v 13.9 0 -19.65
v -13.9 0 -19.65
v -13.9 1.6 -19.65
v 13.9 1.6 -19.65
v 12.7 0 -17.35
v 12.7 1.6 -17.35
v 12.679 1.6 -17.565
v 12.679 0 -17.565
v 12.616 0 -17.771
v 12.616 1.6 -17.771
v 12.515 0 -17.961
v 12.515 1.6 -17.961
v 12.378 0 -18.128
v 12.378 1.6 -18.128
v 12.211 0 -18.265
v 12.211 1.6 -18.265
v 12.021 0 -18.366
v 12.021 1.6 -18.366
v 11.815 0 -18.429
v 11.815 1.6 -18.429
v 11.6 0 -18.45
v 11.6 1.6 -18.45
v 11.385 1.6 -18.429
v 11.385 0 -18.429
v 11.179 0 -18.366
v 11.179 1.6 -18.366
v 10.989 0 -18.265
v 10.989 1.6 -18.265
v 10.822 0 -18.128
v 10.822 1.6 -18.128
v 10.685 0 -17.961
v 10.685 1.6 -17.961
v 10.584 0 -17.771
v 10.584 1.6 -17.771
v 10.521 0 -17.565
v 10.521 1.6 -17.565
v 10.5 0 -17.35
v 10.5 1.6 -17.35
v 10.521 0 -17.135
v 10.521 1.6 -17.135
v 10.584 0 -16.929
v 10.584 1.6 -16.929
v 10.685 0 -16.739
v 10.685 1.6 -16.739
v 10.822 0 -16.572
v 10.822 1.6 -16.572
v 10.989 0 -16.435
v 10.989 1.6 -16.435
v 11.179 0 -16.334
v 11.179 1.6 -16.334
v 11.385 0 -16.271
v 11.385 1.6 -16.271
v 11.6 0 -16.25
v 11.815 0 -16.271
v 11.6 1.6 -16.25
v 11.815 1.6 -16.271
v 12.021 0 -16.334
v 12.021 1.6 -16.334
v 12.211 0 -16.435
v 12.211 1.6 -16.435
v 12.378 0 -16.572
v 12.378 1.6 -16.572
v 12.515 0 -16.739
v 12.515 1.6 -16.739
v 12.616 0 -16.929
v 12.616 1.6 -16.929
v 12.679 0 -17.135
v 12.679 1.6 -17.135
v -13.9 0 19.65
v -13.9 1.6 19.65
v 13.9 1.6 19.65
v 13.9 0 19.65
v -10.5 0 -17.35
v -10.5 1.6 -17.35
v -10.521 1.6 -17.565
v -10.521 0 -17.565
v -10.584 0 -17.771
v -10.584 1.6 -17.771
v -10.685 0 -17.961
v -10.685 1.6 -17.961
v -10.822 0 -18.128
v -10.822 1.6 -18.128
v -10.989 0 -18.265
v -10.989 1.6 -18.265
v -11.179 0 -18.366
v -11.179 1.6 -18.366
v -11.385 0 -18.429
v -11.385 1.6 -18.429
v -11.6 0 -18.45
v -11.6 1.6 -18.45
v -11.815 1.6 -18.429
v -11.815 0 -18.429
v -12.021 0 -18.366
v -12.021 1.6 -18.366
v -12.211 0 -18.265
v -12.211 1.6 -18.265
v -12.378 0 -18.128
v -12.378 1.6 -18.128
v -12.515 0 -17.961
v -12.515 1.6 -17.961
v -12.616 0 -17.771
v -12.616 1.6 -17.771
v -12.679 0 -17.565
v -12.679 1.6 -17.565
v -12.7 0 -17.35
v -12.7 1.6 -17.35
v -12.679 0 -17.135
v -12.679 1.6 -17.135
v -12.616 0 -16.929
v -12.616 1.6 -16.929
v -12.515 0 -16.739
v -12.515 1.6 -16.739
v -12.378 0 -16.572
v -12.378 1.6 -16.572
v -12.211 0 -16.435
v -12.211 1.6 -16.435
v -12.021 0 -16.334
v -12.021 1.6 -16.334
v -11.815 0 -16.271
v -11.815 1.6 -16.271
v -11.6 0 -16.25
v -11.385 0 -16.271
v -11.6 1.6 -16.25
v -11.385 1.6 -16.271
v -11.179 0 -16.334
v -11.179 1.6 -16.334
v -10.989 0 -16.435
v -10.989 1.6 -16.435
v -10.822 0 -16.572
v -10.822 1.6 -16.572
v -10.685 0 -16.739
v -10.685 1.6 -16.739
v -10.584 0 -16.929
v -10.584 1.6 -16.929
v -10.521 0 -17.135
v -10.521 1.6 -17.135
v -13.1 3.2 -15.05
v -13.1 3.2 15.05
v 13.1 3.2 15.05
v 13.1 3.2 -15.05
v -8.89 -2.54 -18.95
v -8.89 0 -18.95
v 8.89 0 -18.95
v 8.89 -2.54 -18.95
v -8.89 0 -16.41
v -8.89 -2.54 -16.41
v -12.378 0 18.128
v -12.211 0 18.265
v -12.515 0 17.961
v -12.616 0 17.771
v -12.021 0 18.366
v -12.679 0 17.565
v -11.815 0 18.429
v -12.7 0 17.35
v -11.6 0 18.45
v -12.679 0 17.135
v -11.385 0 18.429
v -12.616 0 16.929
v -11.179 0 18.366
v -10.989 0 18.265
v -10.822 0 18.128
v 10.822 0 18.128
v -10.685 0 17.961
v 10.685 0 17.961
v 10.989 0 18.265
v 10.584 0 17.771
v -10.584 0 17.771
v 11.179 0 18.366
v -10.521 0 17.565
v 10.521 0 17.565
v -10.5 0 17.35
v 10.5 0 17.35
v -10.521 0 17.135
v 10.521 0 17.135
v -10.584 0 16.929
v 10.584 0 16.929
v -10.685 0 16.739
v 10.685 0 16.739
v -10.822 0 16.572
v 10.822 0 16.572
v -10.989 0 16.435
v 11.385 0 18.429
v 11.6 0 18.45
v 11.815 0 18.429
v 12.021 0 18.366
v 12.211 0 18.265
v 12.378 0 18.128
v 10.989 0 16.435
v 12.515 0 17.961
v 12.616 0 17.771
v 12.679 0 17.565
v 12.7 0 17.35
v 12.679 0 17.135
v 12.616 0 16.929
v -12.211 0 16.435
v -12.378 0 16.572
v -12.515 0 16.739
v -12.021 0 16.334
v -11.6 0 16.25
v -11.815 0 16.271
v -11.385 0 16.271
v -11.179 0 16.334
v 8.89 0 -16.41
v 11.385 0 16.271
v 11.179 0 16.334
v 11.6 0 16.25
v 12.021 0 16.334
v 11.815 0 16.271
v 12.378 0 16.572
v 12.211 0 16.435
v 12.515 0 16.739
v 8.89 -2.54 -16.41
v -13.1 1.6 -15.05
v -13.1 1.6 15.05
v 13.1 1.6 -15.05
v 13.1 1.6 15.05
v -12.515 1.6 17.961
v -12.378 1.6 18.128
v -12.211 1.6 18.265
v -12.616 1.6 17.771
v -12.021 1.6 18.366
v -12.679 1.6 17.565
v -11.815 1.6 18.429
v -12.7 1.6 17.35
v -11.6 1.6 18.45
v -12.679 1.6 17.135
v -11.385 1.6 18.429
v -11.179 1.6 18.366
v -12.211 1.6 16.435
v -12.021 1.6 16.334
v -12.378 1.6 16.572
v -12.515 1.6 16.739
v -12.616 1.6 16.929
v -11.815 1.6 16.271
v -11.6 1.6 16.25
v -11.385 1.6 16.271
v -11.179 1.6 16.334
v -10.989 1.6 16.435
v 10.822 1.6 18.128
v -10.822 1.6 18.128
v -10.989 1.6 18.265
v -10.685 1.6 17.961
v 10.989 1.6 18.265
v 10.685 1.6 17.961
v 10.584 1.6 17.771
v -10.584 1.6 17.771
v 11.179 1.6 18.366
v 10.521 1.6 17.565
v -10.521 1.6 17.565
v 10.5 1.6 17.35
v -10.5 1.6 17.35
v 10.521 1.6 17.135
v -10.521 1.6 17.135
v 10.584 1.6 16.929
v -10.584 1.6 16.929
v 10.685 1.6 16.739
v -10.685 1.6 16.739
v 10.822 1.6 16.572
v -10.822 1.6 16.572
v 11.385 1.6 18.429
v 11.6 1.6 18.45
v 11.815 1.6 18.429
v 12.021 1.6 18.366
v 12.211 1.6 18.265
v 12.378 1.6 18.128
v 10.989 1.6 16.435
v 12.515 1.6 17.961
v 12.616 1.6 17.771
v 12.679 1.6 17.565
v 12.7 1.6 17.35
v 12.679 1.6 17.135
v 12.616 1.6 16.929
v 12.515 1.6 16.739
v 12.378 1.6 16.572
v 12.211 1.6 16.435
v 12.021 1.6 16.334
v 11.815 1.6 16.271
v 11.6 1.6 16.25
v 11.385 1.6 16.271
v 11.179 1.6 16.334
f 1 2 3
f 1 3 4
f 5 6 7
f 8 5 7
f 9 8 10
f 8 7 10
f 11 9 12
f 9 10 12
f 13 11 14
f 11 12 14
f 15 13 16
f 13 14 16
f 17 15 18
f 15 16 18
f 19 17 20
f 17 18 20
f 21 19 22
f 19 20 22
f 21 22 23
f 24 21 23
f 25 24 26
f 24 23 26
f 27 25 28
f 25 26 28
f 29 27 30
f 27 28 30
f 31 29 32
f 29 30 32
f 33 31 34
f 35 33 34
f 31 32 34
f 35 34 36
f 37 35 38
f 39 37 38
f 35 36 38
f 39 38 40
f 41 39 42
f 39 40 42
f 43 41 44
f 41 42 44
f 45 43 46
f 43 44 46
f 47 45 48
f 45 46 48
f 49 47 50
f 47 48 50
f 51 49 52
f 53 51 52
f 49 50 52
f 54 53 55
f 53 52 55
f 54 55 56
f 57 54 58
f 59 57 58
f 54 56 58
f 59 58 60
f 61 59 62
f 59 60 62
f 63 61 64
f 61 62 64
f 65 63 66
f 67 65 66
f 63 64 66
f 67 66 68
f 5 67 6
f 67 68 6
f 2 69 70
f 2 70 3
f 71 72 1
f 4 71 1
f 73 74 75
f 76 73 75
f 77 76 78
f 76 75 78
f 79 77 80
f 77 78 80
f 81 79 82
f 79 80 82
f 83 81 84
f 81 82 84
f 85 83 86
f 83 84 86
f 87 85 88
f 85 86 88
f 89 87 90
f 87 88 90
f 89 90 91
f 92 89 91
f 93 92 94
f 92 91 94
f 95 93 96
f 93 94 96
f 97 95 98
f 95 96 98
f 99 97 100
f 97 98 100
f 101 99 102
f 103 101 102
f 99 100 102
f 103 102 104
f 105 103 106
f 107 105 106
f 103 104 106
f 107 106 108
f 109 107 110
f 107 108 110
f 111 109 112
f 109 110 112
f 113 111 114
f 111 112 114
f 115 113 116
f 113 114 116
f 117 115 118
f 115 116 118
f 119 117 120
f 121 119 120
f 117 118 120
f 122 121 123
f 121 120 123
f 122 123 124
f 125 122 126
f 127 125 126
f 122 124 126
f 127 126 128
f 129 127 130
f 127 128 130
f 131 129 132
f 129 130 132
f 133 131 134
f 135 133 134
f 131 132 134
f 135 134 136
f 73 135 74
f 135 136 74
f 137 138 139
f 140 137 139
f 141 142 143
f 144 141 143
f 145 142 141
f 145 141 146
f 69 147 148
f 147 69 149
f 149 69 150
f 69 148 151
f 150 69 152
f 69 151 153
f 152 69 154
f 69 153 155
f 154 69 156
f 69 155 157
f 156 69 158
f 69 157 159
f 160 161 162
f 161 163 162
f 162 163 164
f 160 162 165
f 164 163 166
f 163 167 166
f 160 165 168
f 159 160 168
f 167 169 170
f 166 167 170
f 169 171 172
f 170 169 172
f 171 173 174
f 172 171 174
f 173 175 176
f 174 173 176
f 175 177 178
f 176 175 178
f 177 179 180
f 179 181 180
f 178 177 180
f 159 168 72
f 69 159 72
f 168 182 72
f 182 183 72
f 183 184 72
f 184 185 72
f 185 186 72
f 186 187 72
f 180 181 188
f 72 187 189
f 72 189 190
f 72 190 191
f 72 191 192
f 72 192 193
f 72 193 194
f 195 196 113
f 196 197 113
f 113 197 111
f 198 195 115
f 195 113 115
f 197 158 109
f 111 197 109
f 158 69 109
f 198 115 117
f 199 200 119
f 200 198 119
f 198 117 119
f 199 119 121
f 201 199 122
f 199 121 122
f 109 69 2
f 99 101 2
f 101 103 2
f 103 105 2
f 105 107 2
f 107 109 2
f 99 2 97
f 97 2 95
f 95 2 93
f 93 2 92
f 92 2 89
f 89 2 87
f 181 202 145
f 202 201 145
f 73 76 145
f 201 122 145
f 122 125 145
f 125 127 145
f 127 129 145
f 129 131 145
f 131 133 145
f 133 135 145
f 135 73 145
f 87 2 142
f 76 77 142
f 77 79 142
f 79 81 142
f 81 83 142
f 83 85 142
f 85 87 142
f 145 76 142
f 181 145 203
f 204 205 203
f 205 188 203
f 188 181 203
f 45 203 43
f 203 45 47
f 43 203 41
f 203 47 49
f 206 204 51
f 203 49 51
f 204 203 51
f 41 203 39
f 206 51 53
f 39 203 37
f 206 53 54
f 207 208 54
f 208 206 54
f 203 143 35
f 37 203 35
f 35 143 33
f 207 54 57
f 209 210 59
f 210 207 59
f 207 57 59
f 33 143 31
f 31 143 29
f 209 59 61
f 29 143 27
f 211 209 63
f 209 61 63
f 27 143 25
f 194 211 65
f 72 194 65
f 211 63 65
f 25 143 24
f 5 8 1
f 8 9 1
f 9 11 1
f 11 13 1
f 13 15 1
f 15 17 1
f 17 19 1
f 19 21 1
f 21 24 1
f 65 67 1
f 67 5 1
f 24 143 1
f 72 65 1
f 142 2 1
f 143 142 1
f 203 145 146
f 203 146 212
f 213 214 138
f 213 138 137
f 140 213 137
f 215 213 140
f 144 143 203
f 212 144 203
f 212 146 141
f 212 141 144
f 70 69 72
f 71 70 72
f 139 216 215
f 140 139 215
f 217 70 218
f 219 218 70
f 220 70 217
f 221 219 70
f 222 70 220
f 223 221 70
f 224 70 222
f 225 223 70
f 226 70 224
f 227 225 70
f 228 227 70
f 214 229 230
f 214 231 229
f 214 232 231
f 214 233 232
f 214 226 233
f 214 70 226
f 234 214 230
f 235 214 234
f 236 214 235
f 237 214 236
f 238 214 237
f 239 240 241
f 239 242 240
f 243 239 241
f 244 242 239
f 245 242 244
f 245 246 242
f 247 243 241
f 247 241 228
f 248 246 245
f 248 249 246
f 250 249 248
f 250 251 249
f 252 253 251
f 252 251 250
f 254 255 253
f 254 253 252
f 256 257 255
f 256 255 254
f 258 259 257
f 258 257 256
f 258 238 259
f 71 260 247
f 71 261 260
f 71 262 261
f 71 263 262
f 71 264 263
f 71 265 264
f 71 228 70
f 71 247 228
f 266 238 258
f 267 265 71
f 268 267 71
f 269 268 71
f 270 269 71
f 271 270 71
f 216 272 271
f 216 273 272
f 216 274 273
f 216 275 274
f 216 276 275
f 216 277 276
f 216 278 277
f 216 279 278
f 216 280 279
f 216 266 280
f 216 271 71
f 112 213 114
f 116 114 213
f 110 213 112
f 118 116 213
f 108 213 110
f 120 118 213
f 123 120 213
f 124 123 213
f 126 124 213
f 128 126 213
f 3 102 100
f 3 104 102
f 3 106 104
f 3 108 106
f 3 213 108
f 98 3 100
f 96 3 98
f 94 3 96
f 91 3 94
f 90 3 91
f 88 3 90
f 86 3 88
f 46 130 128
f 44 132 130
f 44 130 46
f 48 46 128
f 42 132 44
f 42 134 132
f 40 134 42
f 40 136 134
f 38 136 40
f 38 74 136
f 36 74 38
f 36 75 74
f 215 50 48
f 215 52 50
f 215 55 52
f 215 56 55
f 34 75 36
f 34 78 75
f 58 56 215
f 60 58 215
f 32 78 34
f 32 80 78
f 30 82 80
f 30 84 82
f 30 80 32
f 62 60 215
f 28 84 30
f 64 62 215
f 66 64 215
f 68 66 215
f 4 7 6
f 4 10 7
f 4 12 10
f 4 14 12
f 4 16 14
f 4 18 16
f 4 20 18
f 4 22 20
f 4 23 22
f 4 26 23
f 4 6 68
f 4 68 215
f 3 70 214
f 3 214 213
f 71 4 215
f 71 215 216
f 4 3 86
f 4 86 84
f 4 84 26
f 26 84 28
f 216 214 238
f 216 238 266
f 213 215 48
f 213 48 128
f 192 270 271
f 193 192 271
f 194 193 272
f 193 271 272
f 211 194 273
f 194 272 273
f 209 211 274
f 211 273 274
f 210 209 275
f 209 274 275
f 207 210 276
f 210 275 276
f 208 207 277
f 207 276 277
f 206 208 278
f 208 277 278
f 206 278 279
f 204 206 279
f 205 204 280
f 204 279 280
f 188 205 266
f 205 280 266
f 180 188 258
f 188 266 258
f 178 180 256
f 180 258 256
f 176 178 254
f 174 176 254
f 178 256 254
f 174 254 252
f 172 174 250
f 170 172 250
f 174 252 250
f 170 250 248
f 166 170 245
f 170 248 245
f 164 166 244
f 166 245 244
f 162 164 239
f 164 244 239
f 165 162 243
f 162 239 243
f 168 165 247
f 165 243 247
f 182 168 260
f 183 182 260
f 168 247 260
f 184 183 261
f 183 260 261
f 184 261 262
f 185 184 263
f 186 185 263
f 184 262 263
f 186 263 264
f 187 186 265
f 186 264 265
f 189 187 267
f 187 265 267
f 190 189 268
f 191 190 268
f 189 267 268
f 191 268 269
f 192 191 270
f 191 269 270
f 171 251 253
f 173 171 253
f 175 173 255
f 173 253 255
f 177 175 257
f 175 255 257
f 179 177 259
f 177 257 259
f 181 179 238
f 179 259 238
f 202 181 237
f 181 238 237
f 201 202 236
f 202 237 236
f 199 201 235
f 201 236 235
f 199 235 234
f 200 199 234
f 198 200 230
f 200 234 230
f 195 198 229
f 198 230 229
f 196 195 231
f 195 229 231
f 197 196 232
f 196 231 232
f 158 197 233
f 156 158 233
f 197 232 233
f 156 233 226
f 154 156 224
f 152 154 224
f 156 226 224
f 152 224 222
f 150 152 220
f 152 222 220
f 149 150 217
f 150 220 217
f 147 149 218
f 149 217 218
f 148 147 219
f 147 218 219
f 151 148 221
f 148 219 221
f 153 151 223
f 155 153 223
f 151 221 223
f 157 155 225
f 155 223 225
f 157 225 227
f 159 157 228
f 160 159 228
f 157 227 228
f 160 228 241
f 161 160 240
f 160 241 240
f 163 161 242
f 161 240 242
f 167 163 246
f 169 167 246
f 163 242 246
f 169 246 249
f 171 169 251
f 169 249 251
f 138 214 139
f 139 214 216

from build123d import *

# Parameters (mm, degrees)
SKETCH_1_W          = 27.8
SKETCH_1_H          = 39.3
EXTRUDE_1_DEPTH     = 1.6
SKETCH_2_R          = 1.1
CUT_EXTRUDE_1_DEPTH = 1.6
SKETCH_3_W          = 26.2
SKETCH_3_H          = 30.1
EXTRUDE_2_DEPTH     = 1.6
SKETCH_4_W          = 17.78
SKETCH_4_H          = 2.54
EXTRUDE_3_DEPTH     = 2.54


with BuildPart() as part:
    # 草图1 → 凸台-拉伸1 (new body)
    with BuildSketch(Plane(origin=(0, 0, 0), x_dir=(1, 0, 0), z_dir=(0, 1, 0))):
        Rectangle(SKETCH_1_W, SKETCH_1_H)
    extrude(amount=EXTRUDE_1_DEPTH)

    # 草图2 → 切除-拉伸1 (cut)
    with BuildSketch(Plane(origin=(0, 1.6, 0), x_dir=(1, 0, 0), z_dir=(0, 1, 0))):
        with Locations((-11.6, 17.35)):
            Circle(SKETCH_2_R)
        with Locations((11.6, 17.35)):
            Circle(SKETCH_2_R)
        with Locations((-11.6, -17.35)):
            Circle(SKETCH_2_R)
        with Locations((11.6, -17.35)):
            Circle(SKETCH_2_R)
    extrude(amount=-CUT_EXTRUDE_1_DEPTH, mode=Mode.SUBTRACT)

    # 草图3 → 凸台-拉伸2 (add)
    with BuildSketch(Plane(origin=(0, 1.6, 0), x_dir=(1, 0, 0), z_dir=(0, 1, 0))):
        Rectangle(SKETCH_3_W, SKETCH_3_H)
    extrude(amount=EXTRUDE_2_DEPTH)

    # 草图4 → 凸台-拉伸3 (add)
    with BuildSketch(Plane.XZ):
        with Locations((0, -17.68)):
            Rectangle(SKETCH_4_W, SKETCH_4_H)
    extrude(amount=EXTRUDE_3_DEPTH)


solid = part.part
